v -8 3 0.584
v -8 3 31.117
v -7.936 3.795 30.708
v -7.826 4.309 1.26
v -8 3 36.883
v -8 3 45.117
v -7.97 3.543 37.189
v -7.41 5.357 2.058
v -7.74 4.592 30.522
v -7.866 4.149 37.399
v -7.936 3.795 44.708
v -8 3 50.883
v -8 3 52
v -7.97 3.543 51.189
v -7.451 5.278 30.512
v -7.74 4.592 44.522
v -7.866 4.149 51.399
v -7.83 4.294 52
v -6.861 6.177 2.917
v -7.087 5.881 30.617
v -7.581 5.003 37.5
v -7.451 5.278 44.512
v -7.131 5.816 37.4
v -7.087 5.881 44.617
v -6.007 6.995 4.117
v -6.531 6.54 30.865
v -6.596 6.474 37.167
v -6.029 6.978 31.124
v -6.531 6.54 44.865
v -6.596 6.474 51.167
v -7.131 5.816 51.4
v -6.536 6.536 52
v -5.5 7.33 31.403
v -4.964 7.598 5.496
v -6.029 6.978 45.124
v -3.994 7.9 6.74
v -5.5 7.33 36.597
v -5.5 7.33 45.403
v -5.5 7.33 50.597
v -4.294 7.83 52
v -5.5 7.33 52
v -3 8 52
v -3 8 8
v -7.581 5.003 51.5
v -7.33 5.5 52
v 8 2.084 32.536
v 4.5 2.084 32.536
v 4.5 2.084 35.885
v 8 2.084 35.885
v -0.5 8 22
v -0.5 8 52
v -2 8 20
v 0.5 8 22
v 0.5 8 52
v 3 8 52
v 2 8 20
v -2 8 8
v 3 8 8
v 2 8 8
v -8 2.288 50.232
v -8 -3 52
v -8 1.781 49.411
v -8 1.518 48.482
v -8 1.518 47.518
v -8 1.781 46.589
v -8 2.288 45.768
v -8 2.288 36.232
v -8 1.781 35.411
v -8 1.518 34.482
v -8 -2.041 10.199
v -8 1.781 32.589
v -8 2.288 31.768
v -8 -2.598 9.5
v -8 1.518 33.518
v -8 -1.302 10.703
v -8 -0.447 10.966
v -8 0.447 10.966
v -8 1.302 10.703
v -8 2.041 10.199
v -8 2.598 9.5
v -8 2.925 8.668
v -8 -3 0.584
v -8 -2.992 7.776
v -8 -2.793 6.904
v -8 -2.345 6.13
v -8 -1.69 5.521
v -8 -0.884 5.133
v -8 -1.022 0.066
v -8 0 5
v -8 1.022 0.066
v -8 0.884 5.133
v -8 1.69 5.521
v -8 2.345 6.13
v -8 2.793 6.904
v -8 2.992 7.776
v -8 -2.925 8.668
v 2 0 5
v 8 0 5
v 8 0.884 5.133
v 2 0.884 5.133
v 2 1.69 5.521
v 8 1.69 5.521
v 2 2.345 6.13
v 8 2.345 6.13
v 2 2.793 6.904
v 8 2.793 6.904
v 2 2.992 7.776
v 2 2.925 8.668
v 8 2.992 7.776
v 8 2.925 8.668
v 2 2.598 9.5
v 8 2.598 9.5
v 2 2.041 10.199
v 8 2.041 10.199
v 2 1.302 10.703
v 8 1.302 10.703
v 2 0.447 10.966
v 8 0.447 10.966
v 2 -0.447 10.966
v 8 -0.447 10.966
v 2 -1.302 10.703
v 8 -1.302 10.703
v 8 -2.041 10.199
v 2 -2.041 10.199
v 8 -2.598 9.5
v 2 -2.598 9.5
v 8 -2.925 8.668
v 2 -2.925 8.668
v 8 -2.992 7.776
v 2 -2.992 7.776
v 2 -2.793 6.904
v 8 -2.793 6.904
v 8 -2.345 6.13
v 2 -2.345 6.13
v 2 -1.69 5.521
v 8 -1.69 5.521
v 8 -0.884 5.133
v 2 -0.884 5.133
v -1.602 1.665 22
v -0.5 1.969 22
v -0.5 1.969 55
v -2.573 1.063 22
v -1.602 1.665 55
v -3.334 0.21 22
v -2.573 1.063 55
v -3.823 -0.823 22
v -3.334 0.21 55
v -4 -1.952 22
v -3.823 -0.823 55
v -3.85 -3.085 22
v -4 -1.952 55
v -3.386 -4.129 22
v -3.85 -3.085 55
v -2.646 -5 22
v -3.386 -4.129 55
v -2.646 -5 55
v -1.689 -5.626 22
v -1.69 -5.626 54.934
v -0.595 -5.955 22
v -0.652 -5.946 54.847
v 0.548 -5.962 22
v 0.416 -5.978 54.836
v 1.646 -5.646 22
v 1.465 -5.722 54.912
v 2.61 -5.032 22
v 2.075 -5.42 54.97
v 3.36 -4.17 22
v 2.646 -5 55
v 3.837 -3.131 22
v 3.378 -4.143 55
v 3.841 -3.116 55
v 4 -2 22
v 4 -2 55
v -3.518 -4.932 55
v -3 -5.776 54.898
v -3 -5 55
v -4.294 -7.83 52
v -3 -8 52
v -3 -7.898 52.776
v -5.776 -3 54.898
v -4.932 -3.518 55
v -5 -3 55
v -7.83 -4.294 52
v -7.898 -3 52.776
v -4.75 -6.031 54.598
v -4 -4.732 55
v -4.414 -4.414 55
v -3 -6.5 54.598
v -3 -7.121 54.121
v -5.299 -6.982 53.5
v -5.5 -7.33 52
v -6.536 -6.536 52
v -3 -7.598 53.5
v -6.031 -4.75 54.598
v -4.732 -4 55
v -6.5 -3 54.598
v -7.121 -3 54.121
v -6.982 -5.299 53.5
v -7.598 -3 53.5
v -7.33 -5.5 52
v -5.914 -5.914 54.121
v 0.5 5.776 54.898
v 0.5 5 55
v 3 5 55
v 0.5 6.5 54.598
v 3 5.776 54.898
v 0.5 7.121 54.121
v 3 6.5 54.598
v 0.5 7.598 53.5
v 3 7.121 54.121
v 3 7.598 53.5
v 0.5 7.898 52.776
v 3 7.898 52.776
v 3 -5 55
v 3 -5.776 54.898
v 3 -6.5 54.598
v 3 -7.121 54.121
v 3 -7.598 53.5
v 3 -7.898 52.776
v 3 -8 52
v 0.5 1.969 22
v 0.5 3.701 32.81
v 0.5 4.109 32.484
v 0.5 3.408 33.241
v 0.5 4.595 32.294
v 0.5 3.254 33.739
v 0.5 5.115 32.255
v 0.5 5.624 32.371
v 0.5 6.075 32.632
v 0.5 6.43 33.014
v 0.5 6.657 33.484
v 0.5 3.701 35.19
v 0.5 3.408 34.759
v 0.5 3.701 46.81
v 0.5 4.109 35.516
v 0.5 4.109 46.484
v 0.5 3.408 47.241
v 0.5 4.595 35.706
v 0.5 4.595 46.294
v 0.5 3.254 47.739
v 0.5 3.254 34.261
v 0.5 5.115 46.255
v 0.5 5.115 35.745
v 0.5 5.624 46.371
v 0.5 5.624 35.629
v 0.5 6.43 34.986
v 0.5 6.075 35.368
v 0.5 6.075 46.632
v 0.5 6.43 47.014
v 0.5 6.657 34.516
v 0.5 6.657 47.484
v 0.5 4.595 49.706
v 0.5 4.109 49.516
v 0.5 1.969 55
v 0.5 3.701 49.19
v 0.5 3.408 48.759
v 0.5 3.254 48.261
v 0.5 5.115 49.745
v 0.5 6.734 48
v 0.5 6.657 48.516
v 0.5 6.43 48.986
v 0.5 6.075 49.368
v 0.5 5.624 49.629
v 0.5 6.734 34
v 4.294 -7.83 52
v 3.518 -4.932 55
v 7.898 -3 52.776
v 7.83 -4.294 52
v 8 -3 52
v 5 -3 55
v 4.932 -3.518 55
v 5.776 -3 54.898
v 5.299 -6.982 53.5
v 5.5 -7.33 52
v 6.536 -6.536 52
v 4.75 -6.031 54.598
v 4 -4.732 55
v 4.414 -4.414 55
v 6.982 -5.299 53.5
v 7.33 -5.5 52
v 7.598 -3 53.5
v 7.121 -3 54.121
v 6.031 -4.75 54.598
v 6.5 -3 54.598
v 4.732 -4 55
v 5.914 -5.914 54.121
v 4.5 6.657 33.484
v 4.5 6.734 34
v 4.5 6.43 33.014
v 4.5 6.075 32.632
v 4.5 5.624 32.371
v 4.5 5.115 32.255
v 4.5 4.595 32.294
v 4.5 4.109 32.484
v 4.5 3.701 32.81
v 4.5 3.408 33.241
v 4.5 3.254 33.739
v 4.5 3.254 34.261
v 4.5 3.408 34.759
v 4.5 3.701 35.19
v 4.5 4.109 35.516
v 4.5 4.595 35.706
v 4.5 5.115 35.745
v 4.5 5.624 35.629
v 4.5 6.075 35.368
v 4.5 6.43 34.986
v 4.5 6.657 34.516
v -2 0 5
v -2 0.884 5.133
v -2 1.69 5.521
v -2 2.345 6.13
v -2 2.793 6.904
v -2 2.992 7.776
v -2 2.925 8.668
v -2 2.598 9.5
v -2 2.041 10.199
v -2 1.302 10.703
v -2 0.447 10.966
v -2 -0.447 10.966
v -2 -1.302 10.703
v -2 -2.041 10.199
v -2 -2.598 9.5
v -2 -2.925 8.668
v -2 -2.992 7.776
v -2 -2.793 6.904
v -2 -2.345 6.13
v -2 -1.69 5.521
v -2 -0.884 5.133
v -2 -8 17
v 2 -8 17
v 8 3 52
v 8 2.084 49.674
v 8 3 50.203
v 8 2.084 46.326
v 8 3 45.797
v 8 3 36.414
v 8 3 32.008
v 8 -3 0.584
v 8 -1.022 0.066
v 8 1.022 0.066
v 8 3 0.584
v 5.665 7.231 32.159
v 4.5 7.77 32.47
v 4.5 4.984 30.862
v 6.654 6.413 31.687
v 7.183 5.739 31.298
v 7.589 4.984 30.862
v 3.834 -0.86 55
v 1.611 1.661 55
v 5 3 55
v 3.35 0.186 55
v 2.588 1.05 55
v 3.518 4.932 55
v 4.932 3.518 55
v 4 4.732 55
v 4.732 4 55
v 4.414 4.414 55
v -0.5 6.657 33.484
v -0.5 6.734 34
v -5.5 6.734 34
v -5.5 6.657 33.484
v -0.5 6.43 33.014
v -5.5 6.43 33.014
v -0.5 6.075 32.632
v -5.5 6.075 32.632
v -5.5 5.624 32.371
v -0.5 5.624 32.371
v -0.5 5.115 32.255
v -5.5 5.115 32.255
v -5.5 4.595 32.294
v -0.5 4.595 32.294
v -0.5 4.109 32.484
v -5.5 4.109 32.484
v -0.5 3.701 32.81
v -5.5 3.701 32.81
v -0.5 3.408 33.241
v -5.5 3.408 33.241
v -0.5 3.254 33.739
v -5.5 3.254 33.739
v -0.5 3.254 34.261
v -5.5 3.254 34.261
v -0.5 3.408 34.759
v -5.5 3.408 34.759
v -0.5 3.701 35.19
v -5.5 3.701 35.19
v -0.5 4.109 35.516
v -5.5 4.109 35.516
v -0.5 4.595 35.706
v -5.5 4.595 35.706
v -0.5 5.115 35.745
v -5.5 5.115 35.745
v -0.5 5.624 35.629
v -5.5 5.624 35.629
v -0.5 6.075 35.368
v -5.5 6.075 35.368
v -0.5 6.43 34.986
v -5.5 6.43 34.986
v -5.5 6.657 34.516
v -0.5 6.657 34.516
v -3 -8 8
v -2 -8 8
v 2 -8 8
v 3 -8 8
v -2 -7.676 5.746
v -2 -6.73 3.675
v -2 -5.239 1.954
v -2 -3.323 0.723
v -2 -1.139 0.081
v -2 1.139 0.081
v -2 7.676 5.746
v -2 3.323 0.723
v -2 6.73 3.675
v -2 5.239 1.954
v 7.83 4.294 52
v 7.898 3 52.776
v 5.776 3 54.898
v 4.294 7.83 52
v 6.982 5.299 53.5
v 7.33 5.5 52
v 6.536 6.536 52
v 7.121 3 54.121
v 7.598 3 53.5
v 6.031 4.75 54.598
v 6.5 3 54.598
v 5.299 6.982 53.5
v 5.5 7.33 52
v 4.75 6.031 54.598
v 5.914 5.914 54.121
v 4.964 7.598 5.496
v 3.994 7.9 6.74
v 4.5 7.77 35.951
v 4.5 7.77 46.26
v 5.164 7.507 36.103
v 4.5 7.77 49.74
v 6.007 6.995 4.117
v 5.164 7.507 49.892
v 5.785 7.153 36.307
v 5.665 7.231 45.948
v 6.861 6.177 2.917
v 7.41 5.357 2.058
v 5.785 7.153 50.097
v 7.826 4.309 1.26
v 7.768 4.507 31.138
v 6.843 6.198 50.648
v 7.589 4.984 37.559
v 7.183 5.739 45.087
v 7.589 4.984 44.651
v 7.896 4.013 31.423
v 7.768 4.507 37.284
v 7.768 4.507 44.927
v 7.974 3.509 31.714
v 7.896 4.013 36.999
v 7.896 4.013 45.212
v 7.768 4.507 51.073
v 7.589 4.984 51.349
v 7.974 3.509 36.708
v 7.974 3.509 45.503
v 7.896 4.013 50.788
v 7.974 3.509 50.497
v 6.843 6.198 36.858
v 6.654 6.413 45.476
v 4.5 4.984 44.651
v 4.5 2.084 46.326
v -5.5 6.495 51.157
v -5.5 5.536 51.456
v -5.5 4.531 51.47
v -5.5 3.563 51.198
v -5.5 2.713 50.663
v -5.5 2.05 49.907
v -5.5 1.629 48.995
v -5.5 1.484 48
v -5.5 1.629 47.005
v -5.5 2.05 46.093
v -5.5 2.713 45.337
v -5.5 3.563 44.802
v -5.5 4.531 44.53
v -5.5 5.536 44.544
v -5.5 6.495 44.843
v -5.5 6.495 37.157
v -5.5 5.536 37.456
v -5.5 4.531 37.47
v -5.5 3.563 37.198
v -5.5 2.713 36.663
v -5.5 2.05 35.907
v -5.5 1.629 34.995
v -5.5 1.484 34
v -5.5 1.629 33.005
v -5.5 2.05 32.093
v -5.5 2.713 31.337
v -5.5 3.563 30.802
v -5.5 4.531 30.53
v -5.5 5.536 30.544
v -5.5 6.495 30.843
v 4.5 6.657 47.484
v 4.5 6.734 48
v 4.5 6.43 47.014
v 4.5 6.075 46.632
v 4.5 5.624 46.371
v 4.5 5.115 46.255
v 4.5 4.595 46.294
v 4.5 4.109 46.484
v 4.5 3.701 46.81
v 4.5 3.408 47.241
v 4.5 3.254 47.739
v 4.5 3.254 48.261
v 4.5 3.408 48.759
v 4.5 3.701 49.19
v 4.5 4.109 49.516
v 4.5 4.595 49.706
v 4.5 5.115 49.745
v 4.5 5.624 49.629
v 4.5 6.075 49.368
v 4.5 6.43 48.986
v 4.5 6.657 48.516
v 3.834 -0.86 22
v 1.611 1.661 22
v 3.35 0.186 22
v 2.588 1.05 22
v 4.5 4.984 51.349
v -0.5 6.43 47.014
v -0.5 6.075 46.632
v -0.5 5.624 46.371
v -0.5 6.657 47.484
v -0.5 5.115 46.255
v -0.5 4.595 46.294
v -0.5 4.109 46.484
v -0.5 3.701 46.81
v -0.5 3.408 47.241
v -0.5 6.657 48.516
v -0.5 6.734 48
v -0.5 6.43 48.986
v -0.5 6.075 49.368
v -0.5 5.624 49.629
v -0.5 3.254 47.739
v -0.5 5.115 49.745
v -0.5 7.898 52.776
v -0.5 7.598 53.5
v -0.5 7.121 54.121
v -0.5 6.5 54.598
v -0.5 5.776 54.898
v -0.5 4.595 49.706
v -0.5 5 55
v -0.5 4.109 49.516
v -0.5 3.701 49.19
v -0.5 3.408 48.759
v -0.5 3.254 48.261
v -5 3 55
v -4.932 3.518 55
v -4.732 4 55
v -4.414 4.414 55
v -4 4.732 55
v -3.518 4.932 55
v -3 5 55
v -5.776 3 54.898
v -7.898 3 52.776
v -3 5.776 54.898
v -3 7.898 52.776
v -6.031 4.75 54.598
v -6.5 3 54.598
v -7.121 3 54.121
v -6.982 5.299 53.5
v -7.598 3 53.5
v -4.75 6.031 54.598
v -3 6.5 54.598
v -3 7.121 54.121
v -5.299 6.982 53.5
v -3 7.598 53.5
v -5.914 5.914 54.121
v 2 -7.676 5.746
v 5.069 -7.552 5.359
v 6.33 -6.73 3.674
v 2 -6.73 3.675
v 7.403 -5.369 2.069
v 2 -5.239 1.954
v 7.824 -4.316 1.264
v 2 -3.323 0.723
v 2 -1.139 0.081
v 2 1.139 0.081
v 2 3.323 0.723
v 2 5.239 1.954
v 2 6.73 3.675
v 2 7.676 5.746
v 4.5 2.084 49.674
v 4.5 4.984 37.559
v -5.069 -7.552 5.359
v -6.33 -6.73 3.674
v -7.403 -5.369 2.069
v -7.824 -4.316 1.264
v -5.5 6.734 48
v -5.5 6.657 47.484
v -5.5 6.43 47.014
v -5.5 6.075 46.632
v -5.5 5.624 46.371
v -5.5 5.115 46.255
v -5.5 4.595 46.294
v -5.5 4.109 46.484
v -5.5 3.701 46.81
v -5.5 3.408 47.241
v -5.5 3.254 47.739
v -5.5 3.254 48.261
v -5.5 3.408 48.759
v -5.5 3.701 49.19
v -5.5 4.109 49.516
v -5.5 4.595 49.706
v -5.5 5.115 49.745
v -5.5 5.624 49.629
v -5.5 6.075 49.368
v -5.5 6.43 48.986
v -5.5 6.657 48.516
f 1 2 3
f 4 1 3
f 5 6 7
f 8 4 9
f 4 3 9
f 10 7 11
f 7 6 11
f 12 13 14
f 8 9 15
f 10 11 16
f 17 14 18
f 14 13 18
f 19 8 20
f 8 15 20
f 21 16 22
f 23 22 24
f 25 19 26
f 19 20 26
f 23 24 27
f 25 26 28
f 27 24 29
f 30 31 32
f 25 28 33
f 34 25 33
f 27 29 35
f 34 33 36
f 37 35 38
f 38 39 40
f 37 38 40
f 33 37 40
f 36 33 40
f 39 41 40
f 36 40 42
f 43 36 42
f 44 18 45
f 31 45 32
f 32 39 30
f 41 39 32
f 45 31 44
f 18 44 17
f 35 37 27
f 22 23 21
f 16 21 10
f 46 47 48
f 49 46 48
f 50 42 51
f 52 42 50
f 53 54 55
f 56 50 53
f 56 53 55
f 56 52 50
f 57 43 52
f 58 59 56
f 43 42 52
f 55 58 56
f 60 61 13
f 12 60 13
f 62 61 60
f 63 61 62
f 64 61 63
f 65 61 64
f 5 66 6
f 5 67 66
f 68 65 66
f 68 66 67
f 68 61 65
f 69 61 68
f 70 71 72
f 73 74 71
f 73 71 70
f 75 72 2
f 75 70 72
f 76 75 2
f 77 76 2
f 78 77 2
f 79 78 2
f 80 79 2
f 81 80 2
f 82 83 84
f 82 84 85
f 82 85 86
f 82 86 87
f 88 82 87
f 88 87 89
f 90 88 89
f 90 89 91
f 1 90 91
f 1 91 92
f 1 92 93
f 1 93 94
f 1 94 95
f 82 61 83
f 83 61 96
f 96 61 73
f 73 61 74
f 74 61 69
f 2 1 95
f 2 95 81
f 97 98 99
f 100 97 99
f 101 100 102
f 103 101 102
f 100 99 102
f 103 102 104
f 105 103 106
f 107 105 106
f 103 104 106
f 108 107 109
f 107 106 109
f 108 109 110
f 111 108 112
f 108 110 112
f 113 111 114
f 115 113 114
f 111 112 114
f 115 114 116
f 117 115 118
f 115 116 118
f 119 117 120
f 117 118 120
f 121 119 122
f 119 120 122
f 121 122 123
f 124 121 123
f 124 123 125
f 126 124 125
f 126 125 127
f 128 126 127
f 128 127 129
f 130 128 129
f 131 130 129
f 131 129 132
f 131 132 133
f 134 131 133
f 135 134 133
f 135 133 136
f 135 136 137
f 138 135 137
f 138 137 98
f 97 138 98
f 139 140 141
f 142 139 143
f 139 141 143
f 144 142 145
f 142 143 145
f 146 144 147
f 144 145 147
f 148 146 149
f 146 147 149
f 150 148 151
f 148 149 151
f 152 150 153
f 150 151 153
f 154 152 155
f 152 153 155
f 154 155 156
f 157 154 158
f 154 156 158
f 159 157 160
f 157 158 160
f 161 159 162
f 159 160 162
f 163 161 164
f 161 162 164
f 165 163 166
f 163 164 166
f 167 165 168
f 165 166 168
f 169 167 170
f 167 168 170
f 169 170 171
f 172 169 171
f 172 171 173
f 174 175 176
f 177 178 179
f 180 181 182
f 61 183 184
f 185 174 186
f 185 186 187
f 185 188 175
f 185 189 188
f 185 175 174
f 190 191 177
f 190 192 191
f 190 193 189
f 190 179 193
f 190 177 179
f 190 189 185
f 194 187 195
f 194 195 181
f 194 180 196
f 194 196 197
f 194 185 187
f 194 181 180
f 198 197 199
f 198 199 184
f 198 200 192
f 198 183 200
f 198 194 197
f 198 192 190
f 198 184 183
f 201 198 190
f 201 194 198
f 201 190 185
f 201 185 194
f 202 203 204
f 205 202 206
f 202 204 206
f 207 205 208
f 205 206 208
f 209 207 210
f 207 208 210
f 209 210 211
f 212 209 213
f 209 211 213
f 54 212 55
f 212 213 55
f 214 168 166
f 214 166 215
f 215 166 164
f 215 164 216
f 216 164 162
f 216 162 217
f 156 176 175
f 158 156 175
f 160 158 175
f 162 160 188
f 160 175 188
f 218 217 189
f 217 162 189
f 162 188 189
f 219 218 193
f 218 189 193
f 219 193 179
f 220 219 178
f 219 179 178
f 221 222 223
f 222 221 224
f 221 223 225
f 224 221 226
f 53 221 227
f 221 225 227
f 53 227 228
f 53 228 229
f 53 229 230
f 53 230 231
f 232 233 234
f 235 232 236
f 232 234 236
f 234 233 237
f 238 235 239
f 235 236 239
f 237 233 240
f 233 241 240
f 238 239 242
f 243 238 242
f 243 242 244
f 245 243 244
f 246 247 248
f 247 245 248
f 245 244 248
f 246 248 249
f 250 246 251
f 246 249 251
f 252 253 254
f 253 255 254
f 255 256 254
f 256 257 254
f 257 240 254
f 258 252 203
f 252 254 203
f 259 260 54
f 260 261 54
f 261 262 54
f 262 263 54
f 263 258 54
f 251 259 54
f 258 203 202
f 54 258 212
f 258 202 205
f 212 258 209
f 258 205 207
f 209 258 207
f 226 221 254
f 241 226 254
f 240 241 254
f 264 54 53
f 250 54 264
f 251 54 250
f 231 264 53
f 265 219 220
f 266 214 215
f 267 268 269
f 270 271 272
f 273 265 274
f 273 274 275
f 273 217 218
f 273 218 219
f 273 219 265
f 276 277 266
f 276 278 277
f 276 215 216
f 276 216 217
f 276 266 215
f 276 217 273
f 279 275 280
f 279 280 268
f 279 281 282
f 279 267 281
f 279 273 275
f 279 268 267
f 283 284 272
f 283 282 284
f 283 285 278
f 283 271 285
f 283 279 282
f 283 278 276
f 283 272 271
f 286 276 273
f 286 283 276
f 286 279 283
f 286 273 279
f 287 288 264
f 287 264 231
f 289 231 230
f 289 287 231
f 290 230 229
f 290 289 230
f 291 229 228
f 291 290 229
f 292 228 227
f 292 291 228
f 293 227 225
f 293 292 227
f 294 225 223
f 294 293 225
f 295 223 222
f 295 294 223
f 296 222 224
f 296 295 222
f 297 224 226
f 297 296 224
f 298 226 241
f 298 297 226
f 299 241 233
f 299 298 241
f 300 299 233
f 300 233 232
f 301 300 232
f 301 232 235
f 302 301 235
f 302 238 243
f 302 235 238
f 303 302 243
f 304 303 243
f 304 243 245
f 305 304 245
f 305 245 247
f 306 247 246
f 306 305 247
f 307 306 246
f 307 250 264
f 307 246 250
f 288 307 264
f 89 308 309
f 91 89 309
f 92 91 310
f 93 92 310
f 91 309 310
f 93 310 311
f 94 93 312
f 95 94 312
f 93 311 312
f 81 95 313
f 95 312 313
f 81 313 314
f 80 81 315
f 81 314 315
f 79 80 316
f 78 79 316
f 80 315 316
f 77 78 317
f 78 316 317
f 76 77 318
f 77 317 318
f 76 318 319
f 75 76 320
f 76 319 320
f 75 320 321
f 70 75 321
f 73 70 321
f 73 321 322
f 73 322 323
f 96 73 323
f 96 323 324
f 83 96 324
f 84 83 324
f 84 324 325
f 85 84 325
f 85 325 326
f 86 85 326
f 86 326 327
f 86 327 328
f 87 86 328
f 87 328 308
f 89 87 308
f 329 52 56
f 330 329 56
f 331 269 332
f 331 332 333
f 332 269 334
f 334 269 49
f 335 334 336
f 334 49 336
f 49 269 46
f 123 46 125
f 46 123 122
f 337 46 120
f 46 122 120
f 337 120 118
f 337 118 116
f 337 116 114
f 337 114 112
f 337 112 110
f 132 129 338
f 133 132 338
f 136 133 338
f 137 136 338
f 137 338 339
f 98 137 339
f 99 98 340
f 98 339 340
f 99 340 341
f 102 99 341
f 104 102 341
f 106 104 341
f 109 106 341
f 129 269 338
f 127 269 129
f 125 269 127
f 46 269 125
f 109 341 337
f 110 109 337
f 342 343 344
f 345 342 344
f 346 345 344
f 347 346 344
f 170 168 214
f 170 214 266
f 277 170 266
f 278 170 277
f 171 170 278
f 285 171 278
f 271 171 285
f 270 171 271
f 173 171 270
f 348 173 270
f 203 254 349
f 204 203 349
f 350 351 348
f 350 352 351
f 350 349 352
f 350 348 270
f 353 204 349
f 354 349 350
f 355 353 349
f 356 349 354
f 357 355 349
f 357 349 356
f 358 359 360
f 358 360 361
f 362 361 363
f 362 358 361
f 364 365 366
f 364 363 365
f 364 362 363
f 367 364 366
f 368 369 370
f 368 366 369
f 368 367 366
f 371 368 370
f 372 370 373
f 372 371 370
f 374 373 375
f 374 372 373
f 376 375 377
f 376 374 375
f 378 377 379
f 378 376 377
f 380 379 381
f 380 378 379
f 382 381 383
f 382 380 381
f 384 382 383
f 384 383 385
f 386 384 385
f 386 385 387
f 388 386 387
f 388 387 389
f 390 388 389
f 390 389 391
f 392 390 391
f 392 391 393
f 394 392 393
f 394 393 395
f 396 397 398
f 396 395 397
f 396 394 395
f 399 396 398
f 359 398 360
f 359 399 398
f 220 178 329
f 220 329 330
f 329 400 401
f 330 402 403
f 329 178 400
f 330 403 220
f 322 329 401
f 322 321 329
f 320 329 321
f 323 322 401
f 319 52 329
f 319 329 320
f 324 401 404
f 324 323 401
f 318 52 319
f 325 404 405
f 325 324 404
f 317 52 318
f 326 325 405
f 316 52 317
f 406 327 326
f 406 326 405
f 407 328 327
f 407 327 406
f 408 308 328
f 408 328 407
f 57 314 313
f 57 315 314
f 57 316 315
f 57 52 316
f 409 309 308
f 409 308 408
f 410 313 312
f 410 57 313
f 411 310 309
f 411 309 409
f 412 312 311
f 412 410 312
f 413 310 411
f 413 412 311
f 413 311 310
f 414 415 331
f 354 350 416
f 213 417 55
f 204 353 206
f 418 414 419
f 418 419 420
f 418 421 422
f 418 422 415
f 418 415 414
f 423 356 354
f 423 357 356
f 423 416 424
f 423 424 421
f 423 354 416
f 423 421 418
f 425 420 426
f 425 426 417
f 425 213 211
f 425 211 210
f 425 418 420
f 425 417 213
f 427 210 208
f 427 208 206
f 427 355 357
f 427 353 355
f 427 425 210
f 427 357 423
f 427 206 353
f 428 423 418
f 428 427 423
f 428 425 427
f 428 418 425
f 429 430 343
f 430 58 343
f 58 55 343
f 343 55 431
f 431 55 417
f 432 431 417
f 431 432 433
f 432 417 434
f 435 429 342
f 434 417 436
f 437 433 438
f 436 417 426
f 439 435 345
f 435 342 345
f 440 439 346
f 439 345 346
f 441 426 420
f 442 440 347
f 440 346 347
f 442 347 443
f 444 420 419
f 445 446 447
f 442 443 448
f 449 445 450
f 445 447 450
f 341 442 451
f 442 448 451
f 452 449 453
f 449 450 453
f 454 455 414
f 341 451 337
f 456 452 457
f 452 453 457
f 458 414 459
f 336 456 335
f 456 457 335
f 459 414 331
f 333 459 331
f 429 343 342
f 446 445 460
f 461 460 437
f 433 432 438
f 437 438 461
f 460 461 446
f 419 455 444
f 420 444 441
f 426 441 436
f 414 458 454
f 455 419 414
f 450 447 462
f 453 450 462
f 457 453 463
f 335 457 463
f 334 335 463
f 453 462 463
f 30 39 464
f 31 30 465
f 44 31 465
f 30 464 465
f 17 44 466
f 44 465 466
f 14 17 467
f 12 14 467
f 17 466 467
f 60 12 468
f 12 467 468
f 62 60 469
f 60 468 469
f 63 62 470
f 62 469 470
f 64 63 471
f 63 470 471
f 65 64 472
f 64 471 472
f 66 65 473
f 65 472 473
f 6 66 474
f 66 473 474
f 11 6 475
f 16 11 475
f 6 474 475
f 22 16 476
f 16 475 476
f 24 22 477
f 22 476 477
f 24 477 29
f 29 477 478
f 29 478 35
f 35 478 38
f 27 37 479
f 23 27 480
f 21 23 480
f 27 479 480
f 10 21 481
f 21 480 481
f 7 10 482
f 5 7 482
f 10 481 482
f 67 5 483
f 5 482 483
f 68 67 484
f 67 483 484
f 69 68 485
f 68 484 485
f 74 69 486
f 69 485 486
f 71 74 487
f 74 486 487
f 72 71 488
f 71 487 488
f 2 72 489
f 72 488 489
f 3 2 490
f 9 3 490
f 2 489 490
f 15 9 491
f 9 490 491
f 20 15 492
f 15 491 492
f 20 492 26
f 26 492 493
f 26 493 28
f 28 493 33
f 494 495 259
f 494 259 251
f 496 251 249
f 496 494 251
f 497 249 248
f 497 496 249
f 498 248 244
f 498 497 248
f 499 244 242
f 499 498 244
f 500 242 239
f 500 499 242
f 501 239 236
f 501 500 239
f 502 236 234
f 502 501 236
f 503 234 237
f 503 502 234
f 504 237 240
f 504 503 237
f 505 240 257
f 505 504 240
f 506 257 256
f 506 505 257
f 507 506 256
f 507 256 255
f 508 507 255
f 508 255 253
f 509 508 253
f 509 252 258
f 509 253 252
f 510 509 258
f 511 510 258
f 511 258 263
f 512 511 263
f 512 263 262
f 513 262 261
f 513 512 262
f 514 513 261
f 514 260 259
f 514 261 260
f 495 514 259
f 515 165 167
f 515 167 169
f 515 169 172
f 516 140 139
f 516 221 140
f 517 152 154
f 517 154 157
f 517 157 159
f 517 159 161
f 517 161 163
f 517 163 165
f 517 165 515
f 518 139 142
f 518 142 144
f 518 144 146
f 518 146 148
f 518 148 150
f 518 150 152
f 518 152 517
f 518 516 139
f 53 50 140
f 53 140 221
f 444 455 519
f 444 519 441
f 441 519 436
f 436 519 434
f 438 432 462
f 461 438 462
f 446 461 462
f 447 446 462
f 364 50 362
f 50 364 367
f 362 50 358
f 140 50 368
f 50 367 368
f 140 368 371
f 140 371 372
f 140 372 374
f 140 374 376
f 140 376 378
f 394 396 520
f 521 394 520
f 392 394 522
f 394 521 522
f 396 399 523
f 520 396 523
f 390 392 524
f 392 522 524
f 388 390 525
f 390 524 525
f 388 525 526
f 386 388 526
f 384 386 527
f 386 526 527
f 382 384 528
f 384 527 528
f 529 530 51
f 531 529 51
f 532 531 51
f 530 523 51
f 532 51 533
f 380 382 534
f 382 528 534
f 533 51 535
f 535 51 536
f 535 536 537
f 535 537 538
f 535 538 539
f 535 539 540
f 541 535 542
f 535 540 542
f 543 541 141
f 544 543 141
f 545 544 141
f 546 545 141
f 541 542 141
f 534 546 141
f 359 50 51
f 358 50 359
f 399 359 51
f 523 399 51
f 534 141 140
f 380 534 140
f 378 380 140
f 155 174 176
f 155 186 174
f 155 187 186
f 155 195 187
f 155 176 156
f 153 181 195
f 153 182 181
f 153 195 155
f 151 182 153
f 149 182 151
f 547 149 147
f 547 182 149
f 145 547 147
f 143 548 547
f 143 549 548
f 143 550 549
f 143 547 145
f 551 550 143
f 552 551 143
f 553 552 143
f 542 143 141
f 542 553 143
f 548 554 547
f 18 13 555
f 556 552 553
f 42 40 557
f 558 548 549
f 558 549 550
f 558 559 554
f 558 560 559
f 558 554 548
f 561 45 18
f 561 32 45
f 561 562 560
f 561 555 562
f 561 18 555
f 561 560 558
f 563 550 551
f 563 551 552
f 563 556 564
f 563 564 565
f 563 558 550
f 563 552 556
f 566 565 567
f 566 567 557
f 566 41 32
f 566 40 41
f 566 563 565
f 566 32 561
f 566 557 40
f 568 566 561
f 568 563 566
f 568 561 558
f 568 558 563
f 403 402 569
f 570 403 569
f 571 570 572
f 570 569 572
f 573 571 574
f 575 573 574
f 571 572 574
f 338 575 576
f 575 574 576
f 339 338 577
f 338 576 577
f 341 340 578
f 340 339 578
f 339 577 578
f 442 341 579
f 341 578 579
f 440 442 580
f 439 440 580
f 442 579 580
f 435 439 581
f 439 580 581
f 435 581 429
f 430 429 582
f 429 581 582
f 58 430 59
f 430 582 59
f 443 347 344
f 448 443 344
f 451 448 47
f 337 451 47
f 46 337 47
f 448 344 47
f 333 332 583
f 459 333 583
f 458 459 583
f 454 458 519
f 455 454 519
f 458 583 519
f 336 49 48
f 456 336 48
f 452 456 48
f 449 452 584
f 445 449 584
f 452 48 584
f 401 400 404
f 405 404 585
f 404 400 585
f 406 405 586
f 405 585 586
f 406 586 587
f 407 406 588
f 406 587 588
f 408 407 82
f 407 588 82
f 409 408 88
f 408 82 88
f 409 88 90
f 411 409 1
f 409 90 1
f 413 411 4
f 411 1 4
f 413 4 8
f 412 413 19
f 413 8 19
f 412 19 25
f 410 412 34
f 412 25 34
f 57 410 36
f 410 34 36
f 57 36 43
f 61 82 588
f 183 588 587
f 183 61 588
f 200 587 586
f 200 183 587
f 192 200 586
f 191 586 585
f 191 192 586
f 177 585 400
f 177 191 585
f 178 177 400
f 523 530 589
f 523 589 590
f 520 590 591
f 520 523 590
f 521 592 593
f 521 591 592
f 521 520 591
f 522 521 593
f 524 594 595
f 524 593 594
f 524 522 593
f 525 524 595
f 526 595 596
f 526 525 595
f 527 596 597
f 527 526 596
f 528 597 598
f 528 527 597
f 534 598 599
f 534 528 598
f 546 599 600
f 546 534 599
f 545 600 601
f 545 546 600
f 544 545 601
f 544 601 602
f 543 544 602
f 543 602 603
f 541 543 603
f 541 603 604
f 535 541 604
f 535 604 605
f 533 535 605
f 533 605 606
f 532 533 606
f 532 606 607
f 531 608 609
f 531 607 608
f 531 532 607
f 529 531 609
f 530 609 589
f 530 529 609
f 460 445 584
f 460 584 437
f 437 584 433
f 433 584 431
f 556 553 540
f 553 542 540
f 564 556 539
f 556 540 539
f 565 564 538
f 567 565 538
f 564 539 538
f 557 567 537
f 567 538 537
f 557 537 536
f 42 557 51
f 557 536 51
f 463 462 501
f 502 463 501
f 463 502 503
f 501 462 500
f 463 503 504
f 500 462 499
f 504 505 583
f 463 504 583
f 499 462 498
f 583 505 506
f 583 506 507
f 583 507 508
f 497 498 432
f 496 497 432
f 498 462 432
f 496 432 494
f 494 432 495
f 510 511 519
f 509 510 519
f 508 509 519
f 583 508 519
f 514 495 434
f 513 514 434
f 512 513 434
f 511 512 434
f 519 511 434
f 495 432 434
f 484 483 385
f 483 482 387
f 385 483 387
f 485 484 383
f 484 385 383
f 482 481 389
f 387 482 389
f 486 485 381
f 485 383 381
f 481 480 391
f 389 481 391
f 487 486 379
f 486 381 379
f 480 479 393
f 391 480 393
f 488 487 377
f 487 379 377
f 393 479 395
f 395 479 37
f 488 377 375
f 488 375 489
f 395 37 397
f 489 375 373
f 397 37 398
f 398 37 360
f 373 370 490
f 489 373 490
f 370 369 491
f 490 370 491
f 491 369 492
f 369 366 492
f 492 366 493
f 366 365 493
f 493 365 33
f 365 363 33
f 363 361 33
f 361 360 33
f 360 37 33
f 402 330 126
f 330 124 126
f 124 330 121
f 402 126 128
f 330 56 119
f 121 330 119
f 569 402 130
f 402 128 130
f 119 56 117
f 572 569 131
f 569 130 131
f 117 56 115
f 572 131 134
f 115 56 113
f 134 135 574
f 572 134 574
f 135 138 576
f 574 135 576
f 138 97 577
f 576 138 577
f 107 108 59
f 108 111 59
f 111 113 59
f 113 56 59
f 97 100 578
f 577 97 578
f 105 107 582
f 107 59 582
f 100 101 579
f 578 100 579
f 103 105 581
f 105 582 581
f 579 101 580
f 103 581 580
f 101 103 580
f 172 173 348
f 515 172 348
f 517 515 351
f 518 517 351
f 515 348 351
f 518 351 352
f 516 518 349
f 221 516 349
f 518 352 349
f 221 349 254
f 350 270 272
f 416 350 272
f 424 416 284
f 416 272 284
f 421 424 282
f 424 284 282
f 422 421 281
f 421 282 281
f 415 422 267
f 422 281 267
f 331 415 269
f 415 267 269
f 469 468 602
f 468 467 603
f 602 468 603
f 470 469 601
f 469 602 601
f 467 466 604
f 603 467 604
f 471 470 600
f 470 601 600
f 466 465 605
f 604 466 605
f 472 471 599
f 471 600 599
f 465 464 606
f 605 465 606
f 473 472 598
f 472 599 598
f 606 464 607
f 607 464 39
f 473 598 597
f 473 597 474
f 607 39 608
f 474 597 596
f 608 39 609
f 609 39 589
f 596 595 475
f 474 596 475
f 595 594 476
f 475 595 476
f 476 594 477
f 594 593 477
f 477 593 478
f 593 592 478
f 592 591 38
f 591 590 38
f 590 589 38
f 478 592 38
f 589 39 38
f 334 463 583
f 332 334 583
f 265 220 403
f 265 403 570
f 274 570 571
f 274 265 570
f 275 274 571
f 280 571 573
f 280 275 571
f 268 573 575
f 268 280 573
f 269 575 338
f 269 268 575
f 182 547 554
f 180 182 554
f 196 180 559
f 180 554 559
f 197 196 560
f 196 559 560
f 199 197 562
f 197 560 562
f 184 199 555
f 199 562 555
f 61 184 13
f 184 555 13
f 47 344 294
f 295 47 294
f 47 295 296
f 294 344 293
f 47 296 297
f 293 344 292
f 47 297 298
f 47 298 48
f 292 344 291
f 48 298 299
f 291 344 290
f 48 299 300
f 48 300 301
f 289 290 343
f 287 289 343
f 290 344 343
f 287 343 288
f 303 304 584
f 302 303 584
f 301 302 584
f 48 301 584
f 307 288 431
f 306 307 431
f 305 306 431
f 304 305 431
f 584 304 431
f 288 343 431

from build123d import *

# Parameters (mm, degrees)
SKETCH1_W               = 16
SKETCH1_H               = 16
BOSS_EXTRUDE1_DEPTH     = 55
SKETCH2_W               = 4
SKETCH2_H               = 17
CUT_EXTRUDE1_DEPTH      = 17
SKETCH3_R               = 3
CUT_EXTRUDE2_DEPTH      = 45
CUT_EXTRUDE3_DEPTH      = 33
FILLET1_R               = 5
FILLET2_R               = 3
CUT_EXTRUDE4_DEPTH      = 40
CUT_EXTRUDE4_DEPTH_BACK = 40
SKETCH5_R               = 1.75
CUT_EXTRUDE5_START      = -4
CUT_EXTRUDE5_DEPTH      = 40
CUT_EXTRUDE6_START      = -5
SKETCH7_R               = 3.5
CUT_EXTRUDE6_DEPTH      = 40
CUT_EXTRUDE7_DEPTH      = 58.835975073
CHAMFER1_SIZE2          = 16
CHAMFER1_SIZE           = 3


# Some blends are built 0.0001 mm under size
with BuildPart() as part:
    # Sketch1 → Boss-Extrude1 (new body)
    with BuildSketch(Plane.XY):
        Rectangle(SKETCH1_W, SKETCH1_H)
    extrude(amount=BOSS_EXTRUDE1_DEPTH)

    # Sketch2 → Cut-Extrude1 (cut)
    with BuildSketch(Plane(origin=(0, 8, 0), x_dir=(1, 0, 0), z_dir=(0, 1, 0))):
        with Locations((0, -8.5)):
            Rectangle(SKETCH2_W, SKETCH2_H)
    extrude(amount=-CUT_EXTRUDE1_DEPTH, mode=Mode.SUBTRACT)

    # Sketch3 → Cut-Extrude2 (cut)
    with BuildSketch(Plane(origin=(8, 0, 0), x_dir=(0, 0, -1), z_dir=(1, 0, 0))):
        with Locations((-8, 0)):
            Circle(SKETCH3_R)
    extrude(amount=-CUT_EXTRUDE2_DEPTH, mode=Mode.SUBTRACT)

    # Sketch4 → Cut-Extrude3 (cut)
    with BuildSketch(Plane.XY.offset(55)):
        with BuildLine():
            Line((0.5, 1.968626967), (0.5, 0.424558432))
            Line((0.5, 0.424558432), (-0.5, 0.424558432))
            Line((-0.5, 0.424558432), (-0.5, 1.968626967))
            ThreePointArc((-0.5, 1.968626967), (-2.645751311, -5), (4, -2))
            ThreePointArc((4, -2), (3, 0.645751311), (0.5, 1.968626967))
        make_face()
        with BuildLine():
            Line((-0.5, 0.424558432), (0.5, 0.424558432))
            Line((0.5, 0.424558432), (0.5, 1.968626967))
            ThreePointArc((0.5, 1.968626967), (0, 2), (-0.5, 1.968626967))
            Line((-0.5, 1.968626967), (-0.5, 0.424558432))
        make_face()
        with BuildLine():
            ThreePointArc((-0.5, 1.968626967), (0, 2), (0.5, 1.968626967))
            Line((0.5, 1.968626967), (0.5, 8))
            Line((0.5, 8), (-0.5, 8))
            Line((-0.5, 8), (-0.5, 1.968626967))
        make_face()
    extrude(amount=-CUT_EXTRUDE3_DEPTH, mode=Mode.SUBTRACT)

    # Fillet1
    fillet1_edges = [part.edges().sort_by_distance(p)[0] for p in [
        (8, -8, 27.5),
        (-8, -8, 27.5),
        (-8, 8, 27.5),
        (8, 8, 27.5),
    ]]
    fillet(fillet1_edges, radius=FILLET1_R - 0.0001)  # a hair under: the kernel refuses the full size

    # Fillet2
    # the kernel refuses this fillet: 3 mm, written as the material it takes off along each edge
    with BuildSketch(Plane(origin=(7, 8, 55), x_dir=(0, -1, 0), z_dir=(-1, 0, 0)), Plane(origin=(3.0001, 8, 55), x_dir=(0, -1, 0), z_dir=(-1, 0, 0))) as fillet2_piece_1:
        with BuildLine():
            CenterArc((FILLET2_R, -FILLET2_R), FILLET2_R, 90, 90)
            Line((0, -FILLET2_R), (0, 0))
            Line((0, 0), (FILLET2_R, 0))
        make_face()
    extrude(amount=10.0001, mode=Mode.SUBTRACT)
    with BuildSketch(Plane(origin=(8, -3.0001, 55), x_dir=(-1, 0, 0), z_dir=(0, 1, 0)), Plane(origin=(-8, 3.0001, 55), x_dir=(1, 0, 0), z_dir=(0, -1, 0))) as fillet2_piece_2:
        with BuildLine():
            CenterArc((FILLET2_R, -FILLET2_R), FILLET2_R, 90, 90)
            Line((0, -FILLET2_R), (0, 0))
            Line((0, 0), (FILLET2_R, 0))
        make_face()
    extrude(amount=6.0002, mode=Mode.SUBTRACT)
    with BuildSketch(Plane(origin=(-3.0001, -8, 55), x_dir=(0, 0, -1), z_dir=(1, 0, 0))) as fillet2_piece_3:
        with BuildLine():
            CenterArc((FILLET2_R, FILLET2_R), FILLET2_R, 180, 90)
            Line((0, FILLET2_R), (0, 0))
            Line((0, 0), (FILLET2_R, 0))
        make_face()
    extrude(amount=6.0002, mode=Mode.SUBTRACT)
    with BuildSketch(Plane(origin=(-3.0001, -3.0001, 55), x_dir=(0, -1, 0), z_dir=(1, 0, 0))) as fillet2_piece_4:
        with BuildLine():
            CenterArc((4.9999 - FILLET2_R, FILLET2_R), FILLET2_R, 270, 90)
            Line((4.9999 - FILLET2_R, 0), (4.9999, 0))
            Line((4.9999, 0), (4.9999, FILLET2_R))
        make_face()
    revolve(axis=Axis((-3.0001, -3.0001, 55), (0, 0, -1)), revolution_arc=90, mode=Mode.SUBTRACT)
    with BuildSketch(Plane(origin=(3.0001, -3.0001, 55), x_dir=(0, -1, 0), z_dir=(-1, 0, 0))) as fillet2_piece_5:
        with BuildLine():
            CenterArc((4.9999 - FILLET2_R, -FILLET2_R), FILLET2_R, 0, 90)
            Line((4.9999, -FILLET2_R), (4.9999, 0))
            Line((4.9999, 0), (4.9999 - FILLET2_R, 0))
        make_face()
    revolve(axis=Axis((3.0001, -3.0001, 55), (0, 0, 1)), revolution_arc=90, mode=Mode.SUBTRACT)
    with BuildSketch(Plane(origin=(-3.0001, 3.0001, 55), x_dir=(-1, 0, 0), z_dir=(0, -1, 0))) as fillet2_piece_6:
        with BuildLine():
            CenterArc((4.9999 - FILLET2_R, FILLET2_R), FILLET2_R, 270, 90)
            Line((4.9999, FILLET2_R), (4.9999, 0))
            Line((4.9999, 0), (4.9999 - FILLET2_R, 0))
        make_face()
    revolve(axis=Axis((-3.0001, 3.0001, 55), (0, 0, -1)), revolution_arc=90, mode=Mode.SUBTRACT)
    with BuildSketch(Plane(origin=(3.0001, 3.0001, 55), x_dir=(1, 0, 0), z_dir=(0, -1, 0))) as fillet2_piece_7:
        with BuildLine():
            CenterArc((4.9999 - FILLET2_R, -FILLET2_R), FILLET2_R, 0, 90)
            Line((4.9999, -FILLET2_R), (4.9999, 0))
            Line((4.9999, 0), (4.9999 - FILLET2_R, 0))
        make_face()
    revolve(axis=Axis((3.0001, 3.0001, 55), (0, 0, 1)), revolution_arc=90, mode=Mode.SUBTRACT)

    # Sketch5 → Cut-Extrude4 (cut, two sides: drawn at the far end of the back side and taken through both)
    with BuildSketch(Plane.ZY.offset(-0.5).offset(-CUT_EXTRUDE4_DEPTH_BACK)):
        with Locations(Location((48, 4.984313483, 0), (0, 0, 90))):
            Circle(SKETCH5_R)
        with Locations(Location((34, 4.984313483, 0), (0, 0, 90))):
            Circle(SKETCH5_R)
    extrude(amount=CUT_EXTRUDE4_DEPTH + CUT_EXTRUDE4_DEPTH_BACK, mode=Mode.SUBTRACT)

    # Sketch6 → Cut-Extrude5 (cut)
    with BuildSketch(Plane.ZY.offset(-0.5).offset(CUT_EXTRUDE5_START)):
        Polygon((49.674315781, 7.884313483), (46.325684219, 7.884313483), (44.651368439, 4.984313483), (46.325684219, 2.084313483), (49.674315781, 2.084313483), (51.348631561, 4.984313483), align=None)
        Polygon((35.885086056, 7.884313483), (32.536454495, 7.884313483), (30.862138714, 4.984313483), (32.536454495, 2.084313483), (35.885086056, 2.084313483), (37.559401836, 4.984313483), align=None)
    extrude(amount=-CUT_EXTRUDE5_DEPTH, mode=Mode.SUBTRACT)

    # Sketch7 → Cut-Extrude6 (cut)
    with BuildSketch(Plane(origin=(-0.5, 0, 0), x_dir=(0, 0, -1), z_dir=(1, 0, 0)).offset(CUT_EXTRUDE6_START)):
        with Locations((-48, 4.984313483)):
            Circle(SKETCH7_R)
        with Locations((-34, 4.984313483)):
            Circle(SKETCH7_R)
    extrude(amount=-CUT_EXTRUDE6_DEPTH, mode=Mode.SUBTRACT)

    # Sketch8 → Cut-Extrude7 (cut, through all)
    with BuildSketch(Plane.ZY.offset(8)):
        with BuildLine():
            Line((8, 8), (8.268392061, 14.01403494))
            ThreePointArc((8.268392061, 14.01403494), (-6.01403494, 0.268392061), (7.731607939, -14.01403494))
            Line((7.731607939, -14.01403494), (8, -8))
            ThreePointArc((8, -8), (0, 0), (8, 8))
        make_face()
    extrude(amount=-CUT_EXTRUDE7_DEPTH, mode=Mode.SUBTRACT)

    # Chamfer1
    chamfer1_edges = [part.edges().sort_by_distance(p)[0] for p in [
        (0, 8, 17),
    ]]
    chamfer1_side = [part.faces().sort_by_distance(p)[0] for p in [
        (0, 8, 17.06),
    ]]
    chamfer(chamfer1_edges, length=CHAMFER1_SIZE - 0.0001, length2=CHAMFER1_SIZE2 - 0.0001, reference=chamfer1_side[0])  # a hair under: the kernel refuses the full size


solid = part.part
